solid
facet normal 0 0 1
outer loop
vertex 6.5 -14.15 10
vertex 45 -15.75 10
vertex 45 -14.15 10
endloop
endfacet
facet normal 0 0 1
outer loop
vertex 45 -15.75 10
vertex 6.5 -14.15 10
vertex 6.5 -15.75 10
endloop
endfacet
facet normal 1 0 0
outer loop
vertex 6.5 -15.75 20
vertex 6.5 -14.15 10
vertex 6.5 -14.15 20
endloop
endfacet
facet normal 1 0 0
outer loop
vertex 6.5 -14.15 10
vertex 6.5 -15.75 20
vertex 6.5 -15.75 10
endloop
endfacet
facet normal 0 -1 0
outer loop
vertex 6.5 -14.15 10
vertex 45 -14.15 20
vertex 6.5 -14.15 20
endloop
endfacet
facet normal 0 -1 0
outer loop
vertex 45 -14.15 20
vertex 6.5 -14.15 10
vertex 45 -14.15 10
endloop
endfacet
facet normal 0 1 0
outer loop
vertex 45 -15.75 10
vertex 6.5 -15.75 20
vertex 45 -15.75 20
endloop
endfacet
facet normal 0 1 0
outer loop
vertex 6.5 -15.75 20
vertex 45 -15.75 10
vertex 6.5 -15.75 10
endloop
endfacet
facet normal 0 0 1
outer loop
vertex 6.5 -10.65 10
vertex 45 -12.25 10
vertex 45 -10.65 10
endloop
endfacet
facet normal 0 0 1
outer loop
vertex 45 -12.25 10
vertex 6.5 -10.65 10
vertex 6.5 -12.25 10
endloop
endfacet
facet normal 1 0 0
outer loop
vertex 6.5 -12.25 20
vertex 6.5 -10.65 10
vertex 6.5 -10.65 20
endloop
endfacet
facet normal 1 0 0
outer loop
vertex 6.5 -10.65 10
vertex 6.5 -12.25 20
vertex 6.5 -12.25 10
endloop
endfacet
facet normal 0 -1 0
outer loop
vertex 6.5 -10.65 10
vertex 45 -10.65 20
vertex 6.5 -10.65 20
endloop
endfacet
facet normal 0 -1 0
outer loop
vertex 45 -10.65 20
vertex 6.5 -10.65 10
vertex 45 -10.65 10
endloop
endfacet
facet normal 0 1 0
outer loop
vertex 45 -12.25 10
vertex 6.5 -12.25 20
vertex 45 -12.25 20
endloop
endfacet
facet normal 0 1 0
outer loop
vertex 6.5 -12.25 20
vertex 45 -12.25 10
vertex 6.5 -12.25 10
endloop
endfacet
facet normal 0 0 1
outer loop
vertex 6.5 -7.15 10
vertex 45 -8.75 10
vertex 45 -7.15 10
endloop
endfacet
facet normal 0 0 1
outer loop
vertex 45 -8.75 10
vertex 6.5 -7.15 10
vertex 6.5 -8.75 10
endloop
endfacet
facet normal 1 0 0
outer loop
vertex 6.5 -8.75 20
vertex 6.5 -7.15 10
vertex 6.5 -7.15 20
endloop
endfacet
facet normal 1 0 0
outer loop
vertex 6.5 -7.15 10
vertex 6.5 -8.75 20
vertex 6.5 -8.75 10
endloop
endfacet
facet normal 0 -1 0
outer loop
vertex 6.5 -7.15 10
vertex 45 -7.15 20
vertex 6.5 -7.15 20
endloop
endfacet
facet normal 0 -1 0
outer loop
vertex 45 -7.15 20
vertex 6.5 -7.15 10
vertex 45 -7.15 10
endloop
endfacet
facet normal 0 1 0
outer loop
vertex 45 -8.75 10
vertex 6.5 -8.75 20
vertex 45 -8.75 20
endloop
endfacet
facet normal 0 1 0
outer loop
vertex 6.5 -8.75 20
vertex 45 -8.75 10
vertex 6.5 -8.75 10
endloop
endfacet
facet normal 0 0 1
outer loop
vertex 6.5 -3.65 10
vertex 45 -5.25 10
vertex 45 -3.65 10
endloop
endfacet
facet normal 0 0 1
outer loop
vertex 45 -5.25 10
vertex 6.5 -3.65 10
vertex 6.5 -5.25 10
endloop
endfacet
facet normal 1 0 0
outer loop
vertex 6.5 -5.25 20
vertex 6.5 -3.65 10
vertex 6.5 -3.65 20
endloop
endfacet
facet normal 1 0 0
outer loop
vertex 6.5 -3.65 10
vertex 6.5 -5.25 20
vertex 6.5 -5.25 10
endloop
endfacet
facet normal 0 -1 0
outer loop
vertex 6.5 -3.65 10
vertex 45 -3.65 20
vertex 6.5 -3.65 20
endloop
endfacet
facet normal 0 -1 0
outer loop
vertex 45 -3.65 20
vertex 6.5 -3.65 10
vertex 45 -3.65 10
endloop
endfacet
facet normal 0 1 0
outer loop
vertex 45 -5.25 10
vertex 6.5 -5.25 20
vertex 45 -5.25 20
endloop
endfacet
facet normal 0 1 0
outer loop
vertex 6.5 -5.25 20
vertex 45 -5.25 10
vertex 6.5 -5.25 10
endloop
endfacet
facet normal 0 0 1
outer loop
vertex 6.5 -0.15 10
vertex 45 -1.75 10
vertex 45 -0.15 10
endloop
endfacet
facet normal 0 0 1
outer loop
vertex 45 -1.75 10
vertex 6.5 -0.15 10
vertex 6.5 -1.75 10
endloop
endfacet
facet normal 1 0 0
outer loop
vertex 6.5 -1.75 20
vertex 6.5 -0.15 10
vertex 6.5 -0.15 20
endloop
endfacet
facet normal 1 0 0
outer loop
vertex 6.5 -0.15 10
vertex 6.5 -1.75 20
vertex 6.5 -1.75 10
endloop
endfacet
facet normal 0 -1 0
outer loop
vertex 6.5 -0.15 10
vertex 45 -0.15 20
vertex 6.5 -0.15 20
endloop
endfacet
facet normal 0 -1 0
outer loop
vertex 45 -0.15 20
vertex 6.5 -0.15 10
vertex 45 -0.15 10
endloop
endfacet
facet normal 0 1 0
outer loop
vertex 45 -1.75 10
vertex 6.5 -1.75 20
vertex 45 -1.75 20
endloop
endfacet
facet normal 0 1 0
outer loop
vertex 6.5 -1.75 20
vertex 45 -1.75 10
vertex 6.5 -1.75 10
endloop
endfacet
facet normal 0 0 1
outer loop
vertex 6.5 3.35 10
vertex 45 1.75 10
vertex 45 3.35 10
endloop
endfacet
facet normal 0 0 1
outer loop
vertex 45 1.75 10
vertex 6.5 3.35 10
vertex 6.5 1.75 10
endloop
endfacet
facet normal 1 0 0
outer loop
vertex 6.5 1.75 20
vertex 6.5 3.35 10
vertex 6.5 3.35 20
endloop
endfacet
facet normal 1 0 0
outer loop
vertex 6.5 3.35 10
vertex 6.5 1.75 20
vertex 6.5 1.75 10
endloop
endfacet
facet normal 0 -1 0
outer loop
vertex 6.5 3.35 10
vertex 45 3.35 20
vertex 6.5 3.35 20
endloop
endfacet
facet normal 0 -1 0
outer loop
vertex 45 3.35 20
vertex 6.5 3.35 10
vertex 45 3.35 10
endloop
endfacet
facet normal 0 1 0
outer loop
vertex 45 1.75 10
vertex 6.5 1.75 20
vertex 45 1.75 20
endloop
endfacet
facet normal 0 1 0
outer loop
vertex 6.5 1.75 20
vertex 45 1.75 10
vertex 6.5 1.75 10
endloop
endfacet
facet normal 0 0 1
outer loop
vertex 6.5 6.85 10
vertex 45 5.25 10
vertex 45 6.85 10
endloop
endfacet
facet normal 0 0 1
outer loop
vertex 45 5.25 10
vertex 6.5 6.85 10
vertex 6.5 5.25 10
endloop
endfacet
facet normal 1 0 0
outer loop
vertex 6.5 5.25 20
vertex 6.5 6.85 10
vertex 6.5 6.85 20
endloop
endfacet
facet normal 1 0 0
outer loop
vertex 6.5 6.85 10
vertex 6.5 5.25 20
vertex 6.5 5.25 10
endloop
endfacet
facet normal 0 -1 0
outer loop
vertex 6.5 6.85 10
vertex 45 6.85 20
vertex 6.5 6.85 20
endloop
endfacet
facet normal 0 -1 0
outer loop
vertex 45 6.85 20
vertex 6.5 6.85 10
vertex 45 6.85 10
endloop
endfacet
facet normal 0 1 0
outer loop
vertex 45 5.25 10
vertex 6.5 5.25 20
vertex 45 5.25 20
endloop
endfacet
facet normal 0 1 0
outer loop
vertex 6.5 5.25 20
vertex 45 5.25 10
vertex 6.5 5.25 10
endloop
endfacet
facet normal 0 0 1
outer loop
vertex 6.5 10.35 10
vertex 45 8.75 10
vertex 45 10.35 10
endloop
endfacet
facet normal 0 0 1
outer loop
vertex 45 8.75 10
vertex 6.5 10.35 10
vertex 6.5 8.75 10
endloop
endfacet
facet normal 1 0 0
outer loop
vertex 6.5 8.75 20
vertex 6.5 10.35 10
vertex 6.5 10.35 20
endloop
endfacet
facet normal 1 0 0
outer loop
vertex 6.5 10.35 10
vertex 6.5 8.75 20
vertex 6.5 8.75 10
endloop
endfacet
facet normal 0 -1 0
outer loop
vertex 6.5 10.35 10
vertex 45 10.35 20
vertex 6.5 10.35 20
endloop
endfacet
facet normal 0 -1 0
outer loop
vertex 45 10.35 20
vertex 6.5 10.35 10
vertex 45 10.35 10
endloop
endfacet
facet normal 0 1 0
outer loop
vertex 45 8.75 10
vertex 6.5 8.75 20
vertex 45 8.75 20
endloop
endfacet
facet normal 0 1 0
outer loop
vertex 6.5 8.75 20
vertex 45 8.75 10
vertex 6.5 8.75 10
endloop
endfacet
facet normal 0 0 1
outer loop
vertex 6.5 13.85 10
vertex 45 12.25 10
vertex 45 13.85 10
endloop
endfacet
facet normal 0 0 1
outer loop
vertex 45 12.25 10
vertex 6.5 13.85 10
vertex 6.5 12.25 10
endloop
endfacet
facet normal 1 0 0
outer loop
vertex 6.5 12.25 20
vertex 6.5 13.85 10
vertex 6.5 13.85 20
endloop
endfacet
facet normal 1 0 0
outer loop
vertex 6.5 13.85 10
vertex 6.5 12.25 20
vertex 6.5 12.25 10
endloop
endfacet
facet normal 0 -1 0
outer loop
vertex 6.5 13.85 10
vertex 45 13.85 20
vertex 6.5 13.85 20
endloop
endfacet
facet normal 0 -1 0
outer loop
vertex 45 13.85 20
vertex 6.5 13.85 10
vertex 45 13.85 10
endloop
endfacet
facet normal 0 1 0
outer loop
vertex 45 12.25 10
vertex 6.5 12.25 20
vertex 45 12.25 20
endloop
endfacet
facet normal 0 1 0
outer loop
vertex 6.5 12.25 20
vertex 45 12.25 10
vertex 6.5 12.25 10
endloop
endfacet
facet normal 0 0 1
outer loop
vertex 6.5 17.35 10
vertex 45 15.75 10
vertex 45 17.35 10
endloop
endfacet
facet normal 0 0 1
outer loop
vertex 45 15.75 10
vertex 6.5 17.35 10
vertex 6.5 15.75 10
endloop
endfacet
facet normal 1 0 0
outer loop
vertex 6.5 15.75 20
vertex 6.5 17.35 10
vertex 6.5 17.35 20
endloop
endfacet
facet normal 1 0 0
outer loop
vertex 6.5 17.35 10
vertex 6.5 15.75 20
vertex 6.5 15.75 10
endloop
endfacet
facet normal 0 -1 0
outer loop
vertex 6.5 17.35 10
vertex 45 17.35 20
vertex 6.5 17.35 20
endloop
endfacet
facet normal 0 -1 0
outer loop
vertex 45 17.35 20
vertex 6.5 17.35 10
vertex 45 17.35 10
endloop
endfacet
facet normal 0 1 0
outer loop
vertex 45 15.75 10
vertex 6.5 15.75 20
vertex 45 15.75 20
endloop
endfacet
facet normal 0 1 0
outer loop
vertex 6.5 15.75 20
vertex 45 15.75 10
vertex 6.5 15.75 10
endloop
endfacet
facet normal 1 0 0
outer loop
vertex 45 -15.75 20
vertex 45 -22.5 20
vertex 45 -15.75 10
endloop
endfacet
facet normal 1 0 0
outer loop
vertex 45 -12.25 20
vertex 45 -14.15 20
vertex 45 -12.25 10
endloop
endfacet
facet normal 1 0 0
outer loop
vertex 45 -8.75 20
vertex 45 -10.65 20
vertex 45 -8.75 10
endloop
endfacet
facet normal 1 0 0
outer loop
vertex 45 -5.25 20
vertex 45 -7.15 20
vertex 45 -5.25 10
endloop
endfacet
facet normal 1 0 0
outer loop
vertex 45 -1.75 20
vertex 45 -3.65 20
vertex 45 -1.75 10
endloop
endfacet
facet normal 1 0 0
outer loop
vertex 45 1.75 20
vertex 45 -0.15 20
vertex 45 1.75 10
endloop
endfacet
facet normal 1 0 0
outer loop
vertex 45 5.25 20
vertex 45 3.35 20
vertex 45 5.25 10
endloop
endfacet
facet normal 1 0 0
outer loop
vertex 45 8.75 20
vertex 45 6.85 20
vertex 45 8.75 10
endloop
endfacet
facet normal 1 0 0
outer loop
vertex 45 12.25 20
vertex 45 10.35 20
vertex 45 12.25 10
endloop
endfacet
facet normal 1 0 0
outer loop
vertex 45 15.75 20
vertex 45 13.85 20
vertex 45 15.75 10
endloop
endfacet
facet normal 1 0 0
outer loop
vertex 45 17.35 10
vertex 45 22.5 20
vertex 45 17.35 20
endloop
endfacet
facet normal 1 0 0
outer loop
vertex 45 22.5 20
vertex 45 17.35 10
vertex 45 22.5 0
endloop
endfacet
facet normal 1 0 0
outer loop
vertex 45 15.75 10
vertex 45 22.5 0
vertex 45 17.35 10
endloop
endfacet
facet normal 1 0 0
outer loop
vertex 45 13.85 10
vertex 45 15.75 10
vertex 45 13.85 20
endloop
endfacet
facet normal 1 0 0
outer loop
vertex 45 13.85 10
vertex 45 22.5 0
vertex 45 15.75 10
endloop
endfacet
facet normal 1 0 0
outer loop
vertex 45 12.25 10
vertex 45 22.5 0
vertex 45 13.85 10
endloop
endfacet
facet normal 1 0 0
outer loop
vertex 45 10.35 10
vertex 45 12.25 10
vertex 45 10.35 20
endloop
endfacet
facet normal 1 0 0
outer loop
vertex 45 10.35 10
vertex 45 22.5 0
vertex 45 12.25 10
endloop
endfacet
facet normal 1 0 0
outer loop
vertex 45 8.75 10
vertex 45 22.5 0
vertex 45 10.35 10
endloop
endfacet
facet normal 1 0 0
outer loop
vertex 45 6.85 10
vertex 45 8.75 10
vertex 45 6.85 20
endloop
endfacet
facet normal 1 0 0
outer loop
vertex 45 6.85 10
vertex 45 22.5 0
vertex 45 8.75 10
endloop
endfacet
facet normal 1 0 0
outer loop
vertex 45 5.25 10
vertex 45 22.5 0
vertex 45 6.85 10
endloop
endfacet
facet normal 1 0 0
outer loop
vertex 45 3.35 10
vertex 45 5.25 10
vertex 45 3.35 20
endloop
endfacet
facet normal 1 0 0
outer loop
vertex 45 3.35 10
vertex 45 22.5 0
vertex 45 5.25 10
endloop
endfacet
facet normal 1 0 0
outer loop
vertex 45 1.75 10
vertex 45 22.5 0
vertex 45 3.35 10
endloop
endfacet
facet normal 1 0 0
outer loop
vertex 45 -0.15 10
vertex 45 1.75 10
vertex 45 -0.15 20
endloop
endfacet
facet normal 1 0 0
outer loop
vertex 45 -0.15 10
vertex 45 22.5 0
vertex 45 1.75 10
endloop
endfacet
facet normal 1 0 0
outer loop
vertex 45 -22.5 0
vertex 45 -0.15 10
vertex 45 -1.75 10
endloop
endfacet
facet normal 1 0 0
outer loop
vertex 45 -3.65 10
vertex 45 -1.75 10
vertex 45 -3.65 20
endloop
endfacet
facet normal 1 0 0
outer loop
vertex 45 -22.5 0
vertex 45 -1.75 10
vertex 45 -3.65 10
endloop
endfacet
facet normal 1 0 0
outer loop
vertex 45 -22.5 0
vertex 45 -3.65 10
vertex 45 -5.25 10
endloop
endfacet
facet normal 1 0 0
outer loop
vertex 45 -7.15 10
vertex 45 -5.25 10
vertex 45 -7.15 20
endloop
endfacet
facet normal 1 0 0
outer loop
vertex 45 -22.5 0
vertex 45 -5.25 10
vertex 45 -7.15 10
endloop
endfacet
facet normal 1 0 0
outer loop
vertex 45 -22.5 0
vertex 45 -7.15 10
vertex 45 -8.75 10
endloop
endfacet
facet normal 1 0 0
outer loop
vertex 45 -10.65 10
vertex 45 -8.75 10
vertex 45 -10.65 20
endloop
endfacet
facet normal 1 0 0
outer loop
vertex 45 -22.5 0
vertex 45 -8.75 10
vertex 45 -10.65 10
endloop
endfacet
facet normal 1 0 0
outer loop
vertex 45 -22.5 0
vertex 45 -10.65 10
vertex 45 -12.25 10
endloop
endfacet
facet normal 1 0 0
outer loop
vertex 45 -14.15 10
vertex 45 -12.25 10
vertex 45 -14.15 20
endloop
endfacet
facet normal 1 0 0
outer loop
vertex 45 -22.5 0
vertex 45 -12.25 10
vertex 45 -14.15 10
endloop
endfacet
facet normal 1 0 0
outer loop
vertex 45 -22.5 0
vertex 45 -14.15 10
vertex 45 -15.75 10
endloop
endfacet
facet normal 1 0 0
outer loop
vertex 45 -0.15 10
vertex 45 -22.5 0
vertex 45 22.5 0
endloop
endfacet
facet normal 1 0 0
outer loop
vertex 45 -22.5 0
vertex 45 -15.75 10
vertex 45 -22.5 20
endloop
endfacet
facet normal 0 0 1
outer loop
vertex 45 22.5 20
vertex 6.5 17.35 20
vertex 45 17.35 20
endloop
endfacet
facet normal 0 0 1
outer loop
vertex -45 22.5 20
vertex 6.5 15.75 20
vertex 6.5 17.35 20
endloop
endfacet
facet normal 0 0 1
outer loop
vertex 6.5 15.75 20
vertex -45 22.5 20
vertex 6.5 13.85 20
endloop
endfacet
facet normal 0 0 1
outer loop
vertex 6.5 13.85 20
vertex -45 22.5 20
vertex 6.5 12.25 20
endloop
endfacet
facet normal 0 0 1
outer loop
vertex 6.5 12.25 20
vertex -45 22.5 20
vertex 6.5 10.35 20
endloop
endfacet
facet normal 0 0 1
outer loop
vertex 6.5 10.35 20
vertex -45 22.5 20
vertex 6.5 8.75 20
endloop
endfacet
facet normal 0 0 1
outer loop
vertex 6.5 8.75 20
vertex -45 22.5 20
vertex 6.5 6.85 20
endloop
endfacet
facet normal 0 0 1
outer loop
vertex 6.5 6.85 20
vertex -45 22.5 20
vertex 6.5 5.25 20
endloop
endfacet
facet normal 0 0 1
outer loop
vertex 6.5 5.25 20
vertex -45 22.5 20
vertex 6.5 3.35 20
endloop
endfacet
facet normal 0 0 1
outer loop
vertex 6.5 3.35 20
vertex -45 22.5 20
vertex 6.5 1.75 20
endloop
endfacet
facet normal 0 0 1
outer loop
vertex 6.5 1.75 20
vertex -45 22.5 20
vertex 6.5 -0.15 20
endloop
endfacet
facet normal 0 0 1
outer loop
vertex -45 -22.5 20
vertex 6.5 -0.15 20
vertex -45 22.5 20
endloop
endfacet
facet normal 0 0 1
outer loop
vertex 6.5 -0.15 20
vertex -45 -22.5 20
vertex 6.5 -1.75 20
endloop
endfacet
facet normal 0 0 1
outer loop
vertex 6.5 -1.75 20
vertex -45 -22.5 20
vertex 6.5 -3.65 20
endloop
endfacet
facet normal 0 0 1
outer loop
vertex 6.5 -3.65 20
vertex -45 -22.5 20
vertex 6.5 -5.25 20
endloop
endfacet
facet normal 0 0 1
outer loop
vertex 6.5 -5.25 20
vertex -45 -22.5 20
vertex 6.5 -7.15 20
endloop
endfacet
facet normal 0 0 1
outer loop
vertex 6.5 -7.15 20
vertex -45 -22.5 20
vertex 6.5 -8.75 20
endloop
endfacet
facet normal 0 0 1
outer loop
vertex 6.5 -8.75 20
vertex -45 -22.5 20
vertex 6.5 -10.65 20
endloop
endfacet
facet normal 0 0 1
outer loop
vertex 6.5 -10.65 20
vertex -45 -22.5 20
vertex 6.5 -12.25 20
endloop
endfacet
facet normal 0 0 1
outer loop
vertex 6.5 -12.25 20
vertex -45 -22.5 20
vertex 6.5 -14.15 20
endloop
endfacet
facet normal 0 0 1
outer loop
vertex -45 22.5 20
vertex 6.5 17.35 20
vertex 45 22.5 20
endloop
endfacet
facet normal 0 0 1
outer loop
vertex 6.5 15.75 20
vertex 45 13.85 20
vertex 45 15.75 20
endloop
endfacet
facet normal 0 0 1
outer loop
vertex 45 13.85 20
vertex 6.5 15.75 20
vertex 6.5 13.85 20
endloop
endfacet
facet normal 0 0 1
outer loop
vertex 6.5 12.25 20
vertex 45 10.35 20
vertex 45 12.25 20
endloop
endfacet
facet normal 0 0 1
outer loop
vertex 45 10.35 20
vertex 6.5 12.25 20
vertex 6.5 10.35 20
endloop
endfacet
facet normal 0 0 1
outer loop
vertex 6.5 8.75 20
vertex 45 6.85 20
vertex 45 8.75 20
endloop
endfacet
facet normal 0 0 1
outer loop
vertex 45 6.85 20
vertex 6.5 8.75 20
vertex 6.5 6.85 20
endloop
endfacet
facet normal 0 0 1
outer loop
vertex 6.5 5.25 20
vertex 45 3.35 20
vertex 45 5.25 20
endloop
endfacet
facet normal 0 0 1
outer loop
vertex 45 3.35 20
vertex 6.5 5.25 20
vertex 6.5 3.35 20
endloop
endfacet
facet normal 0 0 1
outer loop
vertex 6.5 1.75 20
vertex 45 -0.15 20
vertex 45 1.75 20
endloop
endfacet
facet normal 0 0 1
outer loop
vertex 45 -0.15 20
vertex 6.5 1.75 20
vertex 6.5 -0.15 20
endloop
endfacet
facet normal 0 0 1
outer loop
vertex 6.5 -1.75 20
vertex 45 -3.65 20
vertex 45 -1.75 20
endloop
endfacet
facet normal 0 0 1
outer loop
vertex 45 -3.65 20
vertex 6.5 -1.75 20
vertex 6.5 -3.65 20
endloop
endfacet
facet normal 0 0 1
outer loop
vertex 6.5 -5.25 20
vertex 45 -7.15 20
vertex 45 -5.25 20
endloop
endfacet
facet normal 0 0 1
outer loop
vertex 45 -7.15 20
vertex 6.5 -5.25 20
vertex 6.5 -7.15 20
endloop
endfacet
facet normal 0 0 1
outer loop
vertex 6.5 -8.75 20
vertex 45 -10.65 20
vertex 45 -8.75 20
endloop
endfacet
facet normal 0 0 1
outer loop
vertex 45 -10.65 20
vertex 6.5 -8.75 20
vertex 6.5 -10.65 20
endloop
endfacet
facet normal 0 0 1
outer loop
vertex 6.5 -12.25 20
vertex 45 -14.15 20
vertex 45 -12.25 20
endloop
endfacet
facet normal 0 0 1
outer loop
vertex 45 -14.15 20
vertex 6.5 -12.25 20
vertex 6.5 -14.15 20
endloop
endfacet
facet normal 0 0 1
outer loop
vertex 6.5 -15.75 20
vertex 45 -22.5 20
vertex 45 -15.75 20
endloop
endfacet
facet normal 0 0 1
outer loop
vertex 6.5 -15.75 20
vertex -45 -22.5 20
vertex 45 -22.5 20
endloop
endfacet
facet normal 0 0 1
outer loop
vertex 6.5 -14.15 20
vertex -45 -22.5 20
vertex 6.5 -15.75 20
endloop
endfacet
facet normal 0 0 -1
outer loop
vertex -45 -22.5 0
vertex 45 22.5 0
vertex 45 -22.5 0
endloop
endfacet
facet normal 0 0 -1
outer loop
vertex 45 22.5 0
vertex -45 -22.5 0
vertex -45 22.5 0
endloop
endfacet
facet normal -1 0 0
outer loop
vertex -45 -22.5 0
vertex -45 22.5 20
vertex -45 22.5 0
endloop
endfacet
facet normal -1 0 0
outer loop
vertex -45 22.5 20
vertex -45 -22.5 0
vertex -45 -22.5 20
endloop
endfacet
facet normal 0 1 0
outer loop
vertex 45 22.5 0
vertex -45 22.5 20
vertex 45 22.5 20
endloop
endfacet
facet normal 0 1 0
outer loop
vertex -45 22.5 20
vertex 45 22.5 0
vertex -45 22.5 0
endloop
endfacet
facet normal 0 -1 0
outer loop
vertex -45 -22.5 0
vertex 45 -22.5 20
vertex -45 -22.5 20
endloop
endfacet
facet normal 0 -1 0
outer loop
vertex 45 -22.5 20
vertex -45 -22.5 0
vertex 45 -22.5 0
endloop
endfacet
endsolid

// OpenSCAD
// Microscope slide drying rack
// Print orientation: base on XY plane, slots open upward (+Z)

// ---------- Parameters ----------
block_len    = 90;   // base block length along X (mm)
block_wid    = 45;   // base block width along Y (mm)
block_ht     = 20;   // base block height along Z (mm)

slot_count   = 10;   // number of slide slots
slot_len     = 77;   // slot length along X (mm)
slot_wid     = 1.6;  // slot width along Y (mm)
slot_depth   = 10;   // slot depth from top face (mm)
slot_pitch   = 3.5;  // centre-to-centre slot spacing along Y (mm)

eps          = 0.5;  // overcut past faces to avoid coplanar surfaces (mm)

$fn = 64;

// ---------- Derived ----------
slot_x0 = -(slot_len - block_len) / 2;              // first slot start X
slot_y0 = -(slot_count - 1) * slot_pitch / 2;       // first slot centre Y

// ---------- Model ----------
difference() {
    // Base block
    translate([-block_len / 2, -block_wid / 2, 0])
        cube([block_len, block_wid, block_ht]);

    // Parallel slots along X, centred on block in X and Y
    for (i = [0 : slot_count - 1]) {
        translate([slot_x0, slot_y0 + i * slot_pitch, block_ht - slot_depth])
            cube([slot_len, slot_wid, slot_depth + eps]);
    }
}
